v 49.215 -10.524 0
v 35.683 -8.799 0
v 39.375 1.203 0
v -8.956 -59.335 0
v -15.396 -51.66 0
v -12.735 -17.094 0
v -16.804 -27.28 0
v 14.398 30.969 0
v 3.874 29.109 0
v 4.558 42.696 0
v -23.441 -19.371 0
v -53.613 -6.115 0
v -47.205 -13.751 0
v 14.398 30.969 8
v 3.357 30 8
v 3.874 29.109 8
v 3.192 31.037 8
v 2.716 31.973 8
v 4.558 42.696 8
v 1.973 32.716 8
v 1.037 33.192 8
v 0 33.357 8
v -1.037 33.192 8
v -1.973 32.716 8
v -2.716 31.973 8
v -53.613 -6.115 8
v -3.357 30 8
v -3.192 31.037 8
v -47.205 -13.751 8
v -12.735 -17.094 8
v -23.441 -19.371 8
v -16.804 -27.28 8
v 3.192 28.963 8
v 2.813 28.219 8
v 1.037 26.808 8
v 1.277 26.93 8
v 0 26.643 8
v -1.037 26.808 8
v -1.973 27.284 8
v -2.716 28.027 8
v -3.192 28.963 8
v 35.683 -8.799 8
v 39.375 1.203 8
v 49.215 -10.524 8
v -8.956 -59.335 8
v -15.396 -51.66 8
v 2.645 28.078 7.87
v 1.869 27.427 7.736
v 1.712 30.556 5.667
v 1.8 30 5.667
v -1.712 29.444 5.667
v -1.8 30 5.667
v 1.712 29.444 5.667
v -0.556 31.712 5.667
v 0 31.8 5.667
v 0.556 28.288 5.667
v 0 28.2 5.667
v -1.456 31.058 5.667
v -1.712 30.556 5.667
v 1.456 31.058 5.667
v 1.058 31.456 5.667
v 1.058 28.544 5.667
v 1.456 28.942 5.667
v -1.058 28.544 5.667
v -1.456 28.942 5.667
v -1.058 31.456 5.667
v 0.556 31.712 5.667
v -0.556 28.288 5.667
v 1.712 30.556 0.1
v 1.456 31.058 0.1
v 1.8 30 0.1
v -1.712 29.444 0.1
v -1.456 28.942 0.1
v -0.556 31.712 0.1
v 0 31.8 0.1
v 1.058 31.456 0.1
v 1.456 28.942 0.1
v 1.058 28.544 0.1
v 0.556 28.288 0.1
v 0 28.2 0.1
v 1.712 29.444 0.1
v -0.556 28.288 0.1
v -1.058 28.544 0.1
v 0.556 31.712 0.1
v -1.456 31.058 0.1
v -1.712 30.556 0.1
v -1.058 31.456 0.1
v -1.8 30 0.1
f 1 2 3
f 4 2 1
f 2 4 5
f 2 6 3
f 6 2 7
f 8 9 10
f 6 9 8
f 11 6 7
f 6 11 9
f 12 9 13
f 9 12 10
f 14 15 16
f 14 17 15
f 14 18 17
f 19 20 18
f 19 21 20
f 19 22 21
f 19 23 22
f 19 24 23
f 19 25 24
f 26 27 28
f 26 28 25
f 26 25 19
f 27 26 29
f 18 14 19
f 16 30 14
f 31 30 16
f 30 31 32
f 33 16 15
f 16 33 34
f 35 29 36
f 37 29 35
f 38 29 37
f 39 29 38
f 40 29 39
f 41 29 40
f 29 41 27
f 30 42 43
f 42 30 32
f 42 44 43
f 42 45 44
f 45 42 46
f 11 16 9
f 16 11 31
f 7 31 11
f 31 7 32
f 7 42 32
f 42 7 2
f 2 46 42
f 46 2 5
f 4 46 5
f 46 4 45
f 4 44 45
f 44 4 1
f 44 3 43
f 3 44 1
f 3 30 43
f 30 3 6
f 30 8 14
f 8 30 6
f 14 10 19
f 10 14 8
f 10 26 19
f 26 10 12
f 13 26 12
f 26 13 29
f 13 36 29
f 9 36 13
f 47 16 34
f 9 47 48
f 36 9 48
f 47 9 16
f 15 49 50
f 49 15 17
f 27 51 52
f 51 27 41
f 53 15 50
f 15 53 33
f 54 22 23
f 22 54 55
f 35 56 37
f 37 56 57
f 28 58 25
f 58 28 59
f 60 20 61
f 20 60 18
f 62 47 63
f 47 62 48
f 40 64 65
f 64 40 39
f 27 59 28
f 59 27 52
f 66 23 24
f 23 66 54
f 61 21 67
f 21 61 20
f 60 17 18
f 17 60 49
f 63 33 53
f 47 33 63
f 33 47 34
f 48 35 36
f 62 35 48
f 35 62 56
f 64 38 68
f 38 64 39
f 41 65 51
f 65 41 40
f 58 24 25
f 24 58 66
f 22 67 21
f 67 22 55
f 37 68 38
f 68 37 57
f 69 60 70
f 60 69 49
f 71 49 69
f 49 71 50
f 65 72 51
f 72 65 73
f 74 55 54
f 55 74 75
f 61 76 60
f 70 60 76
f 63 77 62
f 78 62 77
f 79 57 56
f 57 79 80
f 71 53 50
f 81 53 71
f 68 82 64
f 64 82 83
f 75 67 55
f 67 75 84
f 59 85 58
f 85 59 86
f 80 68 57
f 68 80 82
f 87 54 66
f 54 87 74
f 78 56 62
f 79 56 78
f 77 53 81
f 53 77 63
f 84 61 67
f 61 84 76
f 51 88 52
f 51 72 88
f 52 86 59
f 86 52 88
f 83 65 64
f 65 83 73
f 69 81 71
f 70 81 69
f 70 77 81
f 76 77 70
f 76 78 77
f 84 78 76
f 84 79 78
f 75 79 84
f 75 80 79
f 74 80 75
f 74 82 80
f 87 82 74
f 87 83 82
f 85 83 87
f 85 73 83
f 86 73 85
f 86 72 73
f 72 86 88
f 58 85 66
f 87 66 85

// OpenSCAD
// Street Numbers for 3D printing
// Charles Tilford, 2019
// License: CC BY-NC-SA 4.0
//   https://creativecommons.org/licenses/by-nc-sa/4.0/

char="M";     // The number/letter to print

// Units are in mm, except for height of letter

// How many inches high should letter be?
inchesHigh=3;
// How thick/deep should letter be (mm)?
depth=8;

// Character coordinates just center the letter
charX=-40;    // Character X coord
charY=-45;    // Character Y coord
topScrew=30;  // Top screw Y coord
botScrew=-58; // Bottom screw Y coord
height=8;     // Thickness of character
// Screw dimensions. Default presumes
// #6 sheet metal screw
screwWid=3.6; // Width of screw shaft
screwTop=6.78;// Width of screw head
screwCon=5.08;// Height of head 'cone'

// Font to print in. Your system needs this
// installed, of course. If changed the hole
// positions almost certainly need to be
// changed, and maybe charX/charY.
fName="Open Sans Extrabold";
// https://fonts.google.com/specimen/Open+Sans
// Designer: Steve Matteson

// Thin floor below holes. My printer was
// struggling to have the hole 'border' stick
// to the stage. Just drill/screw thru it.
holeFloor=0.1; 

// ==========================================
// ===== All values below are auto-calculated
// ==========================================

// Scaled values
scaleFactor=inchesHigh / 3;
cX=charX * scaleFactor;
cY=charY * scaleFactor;
tS=topScrew * scaleFactor;
bS=botScrew * scaleFactor;
// Where do we start drawing screw head cone?
oS=depth - (screwCon-.05);

difference() {
  // We use difference() to punch out the screw holes
  // in the character
    
  // The character itself, 8mm thick
  rotate(a=-50)
  translate([cX,cY,0])
    linear_extrude(height=depth, scale=1)
    text(char, size=(75*scaleFactor),
         $fn=100, font=fName);
    
  // Bottom screw hole
  translate([0,bS,oS]) color("red")
    cylinder(h=screwCon, d2=screwTop,
             d1=0, $fn=20);
   translate([0,bS,holeFloor])
    cylinder(h=20, d=screwWid, $fn=20);
    
  // Top screw hole
  translate([0,tS,oS]) color("red")
    cylinder(h=screwCon, d2=screwTop,
             d1=0, $fn=20);
  translate([0,tS,holeFloor])
    cylinder(h=20, d=screwWid, $fn=20);
}

// Colors are just to aid visualization of
// void spaces. $fn is "featuer number", ie how
// many polygons are devoted to object. The values
// above should be near your printing limit anyway.

// Developed in OpenSCAD
//    https://www.openscad.org/
